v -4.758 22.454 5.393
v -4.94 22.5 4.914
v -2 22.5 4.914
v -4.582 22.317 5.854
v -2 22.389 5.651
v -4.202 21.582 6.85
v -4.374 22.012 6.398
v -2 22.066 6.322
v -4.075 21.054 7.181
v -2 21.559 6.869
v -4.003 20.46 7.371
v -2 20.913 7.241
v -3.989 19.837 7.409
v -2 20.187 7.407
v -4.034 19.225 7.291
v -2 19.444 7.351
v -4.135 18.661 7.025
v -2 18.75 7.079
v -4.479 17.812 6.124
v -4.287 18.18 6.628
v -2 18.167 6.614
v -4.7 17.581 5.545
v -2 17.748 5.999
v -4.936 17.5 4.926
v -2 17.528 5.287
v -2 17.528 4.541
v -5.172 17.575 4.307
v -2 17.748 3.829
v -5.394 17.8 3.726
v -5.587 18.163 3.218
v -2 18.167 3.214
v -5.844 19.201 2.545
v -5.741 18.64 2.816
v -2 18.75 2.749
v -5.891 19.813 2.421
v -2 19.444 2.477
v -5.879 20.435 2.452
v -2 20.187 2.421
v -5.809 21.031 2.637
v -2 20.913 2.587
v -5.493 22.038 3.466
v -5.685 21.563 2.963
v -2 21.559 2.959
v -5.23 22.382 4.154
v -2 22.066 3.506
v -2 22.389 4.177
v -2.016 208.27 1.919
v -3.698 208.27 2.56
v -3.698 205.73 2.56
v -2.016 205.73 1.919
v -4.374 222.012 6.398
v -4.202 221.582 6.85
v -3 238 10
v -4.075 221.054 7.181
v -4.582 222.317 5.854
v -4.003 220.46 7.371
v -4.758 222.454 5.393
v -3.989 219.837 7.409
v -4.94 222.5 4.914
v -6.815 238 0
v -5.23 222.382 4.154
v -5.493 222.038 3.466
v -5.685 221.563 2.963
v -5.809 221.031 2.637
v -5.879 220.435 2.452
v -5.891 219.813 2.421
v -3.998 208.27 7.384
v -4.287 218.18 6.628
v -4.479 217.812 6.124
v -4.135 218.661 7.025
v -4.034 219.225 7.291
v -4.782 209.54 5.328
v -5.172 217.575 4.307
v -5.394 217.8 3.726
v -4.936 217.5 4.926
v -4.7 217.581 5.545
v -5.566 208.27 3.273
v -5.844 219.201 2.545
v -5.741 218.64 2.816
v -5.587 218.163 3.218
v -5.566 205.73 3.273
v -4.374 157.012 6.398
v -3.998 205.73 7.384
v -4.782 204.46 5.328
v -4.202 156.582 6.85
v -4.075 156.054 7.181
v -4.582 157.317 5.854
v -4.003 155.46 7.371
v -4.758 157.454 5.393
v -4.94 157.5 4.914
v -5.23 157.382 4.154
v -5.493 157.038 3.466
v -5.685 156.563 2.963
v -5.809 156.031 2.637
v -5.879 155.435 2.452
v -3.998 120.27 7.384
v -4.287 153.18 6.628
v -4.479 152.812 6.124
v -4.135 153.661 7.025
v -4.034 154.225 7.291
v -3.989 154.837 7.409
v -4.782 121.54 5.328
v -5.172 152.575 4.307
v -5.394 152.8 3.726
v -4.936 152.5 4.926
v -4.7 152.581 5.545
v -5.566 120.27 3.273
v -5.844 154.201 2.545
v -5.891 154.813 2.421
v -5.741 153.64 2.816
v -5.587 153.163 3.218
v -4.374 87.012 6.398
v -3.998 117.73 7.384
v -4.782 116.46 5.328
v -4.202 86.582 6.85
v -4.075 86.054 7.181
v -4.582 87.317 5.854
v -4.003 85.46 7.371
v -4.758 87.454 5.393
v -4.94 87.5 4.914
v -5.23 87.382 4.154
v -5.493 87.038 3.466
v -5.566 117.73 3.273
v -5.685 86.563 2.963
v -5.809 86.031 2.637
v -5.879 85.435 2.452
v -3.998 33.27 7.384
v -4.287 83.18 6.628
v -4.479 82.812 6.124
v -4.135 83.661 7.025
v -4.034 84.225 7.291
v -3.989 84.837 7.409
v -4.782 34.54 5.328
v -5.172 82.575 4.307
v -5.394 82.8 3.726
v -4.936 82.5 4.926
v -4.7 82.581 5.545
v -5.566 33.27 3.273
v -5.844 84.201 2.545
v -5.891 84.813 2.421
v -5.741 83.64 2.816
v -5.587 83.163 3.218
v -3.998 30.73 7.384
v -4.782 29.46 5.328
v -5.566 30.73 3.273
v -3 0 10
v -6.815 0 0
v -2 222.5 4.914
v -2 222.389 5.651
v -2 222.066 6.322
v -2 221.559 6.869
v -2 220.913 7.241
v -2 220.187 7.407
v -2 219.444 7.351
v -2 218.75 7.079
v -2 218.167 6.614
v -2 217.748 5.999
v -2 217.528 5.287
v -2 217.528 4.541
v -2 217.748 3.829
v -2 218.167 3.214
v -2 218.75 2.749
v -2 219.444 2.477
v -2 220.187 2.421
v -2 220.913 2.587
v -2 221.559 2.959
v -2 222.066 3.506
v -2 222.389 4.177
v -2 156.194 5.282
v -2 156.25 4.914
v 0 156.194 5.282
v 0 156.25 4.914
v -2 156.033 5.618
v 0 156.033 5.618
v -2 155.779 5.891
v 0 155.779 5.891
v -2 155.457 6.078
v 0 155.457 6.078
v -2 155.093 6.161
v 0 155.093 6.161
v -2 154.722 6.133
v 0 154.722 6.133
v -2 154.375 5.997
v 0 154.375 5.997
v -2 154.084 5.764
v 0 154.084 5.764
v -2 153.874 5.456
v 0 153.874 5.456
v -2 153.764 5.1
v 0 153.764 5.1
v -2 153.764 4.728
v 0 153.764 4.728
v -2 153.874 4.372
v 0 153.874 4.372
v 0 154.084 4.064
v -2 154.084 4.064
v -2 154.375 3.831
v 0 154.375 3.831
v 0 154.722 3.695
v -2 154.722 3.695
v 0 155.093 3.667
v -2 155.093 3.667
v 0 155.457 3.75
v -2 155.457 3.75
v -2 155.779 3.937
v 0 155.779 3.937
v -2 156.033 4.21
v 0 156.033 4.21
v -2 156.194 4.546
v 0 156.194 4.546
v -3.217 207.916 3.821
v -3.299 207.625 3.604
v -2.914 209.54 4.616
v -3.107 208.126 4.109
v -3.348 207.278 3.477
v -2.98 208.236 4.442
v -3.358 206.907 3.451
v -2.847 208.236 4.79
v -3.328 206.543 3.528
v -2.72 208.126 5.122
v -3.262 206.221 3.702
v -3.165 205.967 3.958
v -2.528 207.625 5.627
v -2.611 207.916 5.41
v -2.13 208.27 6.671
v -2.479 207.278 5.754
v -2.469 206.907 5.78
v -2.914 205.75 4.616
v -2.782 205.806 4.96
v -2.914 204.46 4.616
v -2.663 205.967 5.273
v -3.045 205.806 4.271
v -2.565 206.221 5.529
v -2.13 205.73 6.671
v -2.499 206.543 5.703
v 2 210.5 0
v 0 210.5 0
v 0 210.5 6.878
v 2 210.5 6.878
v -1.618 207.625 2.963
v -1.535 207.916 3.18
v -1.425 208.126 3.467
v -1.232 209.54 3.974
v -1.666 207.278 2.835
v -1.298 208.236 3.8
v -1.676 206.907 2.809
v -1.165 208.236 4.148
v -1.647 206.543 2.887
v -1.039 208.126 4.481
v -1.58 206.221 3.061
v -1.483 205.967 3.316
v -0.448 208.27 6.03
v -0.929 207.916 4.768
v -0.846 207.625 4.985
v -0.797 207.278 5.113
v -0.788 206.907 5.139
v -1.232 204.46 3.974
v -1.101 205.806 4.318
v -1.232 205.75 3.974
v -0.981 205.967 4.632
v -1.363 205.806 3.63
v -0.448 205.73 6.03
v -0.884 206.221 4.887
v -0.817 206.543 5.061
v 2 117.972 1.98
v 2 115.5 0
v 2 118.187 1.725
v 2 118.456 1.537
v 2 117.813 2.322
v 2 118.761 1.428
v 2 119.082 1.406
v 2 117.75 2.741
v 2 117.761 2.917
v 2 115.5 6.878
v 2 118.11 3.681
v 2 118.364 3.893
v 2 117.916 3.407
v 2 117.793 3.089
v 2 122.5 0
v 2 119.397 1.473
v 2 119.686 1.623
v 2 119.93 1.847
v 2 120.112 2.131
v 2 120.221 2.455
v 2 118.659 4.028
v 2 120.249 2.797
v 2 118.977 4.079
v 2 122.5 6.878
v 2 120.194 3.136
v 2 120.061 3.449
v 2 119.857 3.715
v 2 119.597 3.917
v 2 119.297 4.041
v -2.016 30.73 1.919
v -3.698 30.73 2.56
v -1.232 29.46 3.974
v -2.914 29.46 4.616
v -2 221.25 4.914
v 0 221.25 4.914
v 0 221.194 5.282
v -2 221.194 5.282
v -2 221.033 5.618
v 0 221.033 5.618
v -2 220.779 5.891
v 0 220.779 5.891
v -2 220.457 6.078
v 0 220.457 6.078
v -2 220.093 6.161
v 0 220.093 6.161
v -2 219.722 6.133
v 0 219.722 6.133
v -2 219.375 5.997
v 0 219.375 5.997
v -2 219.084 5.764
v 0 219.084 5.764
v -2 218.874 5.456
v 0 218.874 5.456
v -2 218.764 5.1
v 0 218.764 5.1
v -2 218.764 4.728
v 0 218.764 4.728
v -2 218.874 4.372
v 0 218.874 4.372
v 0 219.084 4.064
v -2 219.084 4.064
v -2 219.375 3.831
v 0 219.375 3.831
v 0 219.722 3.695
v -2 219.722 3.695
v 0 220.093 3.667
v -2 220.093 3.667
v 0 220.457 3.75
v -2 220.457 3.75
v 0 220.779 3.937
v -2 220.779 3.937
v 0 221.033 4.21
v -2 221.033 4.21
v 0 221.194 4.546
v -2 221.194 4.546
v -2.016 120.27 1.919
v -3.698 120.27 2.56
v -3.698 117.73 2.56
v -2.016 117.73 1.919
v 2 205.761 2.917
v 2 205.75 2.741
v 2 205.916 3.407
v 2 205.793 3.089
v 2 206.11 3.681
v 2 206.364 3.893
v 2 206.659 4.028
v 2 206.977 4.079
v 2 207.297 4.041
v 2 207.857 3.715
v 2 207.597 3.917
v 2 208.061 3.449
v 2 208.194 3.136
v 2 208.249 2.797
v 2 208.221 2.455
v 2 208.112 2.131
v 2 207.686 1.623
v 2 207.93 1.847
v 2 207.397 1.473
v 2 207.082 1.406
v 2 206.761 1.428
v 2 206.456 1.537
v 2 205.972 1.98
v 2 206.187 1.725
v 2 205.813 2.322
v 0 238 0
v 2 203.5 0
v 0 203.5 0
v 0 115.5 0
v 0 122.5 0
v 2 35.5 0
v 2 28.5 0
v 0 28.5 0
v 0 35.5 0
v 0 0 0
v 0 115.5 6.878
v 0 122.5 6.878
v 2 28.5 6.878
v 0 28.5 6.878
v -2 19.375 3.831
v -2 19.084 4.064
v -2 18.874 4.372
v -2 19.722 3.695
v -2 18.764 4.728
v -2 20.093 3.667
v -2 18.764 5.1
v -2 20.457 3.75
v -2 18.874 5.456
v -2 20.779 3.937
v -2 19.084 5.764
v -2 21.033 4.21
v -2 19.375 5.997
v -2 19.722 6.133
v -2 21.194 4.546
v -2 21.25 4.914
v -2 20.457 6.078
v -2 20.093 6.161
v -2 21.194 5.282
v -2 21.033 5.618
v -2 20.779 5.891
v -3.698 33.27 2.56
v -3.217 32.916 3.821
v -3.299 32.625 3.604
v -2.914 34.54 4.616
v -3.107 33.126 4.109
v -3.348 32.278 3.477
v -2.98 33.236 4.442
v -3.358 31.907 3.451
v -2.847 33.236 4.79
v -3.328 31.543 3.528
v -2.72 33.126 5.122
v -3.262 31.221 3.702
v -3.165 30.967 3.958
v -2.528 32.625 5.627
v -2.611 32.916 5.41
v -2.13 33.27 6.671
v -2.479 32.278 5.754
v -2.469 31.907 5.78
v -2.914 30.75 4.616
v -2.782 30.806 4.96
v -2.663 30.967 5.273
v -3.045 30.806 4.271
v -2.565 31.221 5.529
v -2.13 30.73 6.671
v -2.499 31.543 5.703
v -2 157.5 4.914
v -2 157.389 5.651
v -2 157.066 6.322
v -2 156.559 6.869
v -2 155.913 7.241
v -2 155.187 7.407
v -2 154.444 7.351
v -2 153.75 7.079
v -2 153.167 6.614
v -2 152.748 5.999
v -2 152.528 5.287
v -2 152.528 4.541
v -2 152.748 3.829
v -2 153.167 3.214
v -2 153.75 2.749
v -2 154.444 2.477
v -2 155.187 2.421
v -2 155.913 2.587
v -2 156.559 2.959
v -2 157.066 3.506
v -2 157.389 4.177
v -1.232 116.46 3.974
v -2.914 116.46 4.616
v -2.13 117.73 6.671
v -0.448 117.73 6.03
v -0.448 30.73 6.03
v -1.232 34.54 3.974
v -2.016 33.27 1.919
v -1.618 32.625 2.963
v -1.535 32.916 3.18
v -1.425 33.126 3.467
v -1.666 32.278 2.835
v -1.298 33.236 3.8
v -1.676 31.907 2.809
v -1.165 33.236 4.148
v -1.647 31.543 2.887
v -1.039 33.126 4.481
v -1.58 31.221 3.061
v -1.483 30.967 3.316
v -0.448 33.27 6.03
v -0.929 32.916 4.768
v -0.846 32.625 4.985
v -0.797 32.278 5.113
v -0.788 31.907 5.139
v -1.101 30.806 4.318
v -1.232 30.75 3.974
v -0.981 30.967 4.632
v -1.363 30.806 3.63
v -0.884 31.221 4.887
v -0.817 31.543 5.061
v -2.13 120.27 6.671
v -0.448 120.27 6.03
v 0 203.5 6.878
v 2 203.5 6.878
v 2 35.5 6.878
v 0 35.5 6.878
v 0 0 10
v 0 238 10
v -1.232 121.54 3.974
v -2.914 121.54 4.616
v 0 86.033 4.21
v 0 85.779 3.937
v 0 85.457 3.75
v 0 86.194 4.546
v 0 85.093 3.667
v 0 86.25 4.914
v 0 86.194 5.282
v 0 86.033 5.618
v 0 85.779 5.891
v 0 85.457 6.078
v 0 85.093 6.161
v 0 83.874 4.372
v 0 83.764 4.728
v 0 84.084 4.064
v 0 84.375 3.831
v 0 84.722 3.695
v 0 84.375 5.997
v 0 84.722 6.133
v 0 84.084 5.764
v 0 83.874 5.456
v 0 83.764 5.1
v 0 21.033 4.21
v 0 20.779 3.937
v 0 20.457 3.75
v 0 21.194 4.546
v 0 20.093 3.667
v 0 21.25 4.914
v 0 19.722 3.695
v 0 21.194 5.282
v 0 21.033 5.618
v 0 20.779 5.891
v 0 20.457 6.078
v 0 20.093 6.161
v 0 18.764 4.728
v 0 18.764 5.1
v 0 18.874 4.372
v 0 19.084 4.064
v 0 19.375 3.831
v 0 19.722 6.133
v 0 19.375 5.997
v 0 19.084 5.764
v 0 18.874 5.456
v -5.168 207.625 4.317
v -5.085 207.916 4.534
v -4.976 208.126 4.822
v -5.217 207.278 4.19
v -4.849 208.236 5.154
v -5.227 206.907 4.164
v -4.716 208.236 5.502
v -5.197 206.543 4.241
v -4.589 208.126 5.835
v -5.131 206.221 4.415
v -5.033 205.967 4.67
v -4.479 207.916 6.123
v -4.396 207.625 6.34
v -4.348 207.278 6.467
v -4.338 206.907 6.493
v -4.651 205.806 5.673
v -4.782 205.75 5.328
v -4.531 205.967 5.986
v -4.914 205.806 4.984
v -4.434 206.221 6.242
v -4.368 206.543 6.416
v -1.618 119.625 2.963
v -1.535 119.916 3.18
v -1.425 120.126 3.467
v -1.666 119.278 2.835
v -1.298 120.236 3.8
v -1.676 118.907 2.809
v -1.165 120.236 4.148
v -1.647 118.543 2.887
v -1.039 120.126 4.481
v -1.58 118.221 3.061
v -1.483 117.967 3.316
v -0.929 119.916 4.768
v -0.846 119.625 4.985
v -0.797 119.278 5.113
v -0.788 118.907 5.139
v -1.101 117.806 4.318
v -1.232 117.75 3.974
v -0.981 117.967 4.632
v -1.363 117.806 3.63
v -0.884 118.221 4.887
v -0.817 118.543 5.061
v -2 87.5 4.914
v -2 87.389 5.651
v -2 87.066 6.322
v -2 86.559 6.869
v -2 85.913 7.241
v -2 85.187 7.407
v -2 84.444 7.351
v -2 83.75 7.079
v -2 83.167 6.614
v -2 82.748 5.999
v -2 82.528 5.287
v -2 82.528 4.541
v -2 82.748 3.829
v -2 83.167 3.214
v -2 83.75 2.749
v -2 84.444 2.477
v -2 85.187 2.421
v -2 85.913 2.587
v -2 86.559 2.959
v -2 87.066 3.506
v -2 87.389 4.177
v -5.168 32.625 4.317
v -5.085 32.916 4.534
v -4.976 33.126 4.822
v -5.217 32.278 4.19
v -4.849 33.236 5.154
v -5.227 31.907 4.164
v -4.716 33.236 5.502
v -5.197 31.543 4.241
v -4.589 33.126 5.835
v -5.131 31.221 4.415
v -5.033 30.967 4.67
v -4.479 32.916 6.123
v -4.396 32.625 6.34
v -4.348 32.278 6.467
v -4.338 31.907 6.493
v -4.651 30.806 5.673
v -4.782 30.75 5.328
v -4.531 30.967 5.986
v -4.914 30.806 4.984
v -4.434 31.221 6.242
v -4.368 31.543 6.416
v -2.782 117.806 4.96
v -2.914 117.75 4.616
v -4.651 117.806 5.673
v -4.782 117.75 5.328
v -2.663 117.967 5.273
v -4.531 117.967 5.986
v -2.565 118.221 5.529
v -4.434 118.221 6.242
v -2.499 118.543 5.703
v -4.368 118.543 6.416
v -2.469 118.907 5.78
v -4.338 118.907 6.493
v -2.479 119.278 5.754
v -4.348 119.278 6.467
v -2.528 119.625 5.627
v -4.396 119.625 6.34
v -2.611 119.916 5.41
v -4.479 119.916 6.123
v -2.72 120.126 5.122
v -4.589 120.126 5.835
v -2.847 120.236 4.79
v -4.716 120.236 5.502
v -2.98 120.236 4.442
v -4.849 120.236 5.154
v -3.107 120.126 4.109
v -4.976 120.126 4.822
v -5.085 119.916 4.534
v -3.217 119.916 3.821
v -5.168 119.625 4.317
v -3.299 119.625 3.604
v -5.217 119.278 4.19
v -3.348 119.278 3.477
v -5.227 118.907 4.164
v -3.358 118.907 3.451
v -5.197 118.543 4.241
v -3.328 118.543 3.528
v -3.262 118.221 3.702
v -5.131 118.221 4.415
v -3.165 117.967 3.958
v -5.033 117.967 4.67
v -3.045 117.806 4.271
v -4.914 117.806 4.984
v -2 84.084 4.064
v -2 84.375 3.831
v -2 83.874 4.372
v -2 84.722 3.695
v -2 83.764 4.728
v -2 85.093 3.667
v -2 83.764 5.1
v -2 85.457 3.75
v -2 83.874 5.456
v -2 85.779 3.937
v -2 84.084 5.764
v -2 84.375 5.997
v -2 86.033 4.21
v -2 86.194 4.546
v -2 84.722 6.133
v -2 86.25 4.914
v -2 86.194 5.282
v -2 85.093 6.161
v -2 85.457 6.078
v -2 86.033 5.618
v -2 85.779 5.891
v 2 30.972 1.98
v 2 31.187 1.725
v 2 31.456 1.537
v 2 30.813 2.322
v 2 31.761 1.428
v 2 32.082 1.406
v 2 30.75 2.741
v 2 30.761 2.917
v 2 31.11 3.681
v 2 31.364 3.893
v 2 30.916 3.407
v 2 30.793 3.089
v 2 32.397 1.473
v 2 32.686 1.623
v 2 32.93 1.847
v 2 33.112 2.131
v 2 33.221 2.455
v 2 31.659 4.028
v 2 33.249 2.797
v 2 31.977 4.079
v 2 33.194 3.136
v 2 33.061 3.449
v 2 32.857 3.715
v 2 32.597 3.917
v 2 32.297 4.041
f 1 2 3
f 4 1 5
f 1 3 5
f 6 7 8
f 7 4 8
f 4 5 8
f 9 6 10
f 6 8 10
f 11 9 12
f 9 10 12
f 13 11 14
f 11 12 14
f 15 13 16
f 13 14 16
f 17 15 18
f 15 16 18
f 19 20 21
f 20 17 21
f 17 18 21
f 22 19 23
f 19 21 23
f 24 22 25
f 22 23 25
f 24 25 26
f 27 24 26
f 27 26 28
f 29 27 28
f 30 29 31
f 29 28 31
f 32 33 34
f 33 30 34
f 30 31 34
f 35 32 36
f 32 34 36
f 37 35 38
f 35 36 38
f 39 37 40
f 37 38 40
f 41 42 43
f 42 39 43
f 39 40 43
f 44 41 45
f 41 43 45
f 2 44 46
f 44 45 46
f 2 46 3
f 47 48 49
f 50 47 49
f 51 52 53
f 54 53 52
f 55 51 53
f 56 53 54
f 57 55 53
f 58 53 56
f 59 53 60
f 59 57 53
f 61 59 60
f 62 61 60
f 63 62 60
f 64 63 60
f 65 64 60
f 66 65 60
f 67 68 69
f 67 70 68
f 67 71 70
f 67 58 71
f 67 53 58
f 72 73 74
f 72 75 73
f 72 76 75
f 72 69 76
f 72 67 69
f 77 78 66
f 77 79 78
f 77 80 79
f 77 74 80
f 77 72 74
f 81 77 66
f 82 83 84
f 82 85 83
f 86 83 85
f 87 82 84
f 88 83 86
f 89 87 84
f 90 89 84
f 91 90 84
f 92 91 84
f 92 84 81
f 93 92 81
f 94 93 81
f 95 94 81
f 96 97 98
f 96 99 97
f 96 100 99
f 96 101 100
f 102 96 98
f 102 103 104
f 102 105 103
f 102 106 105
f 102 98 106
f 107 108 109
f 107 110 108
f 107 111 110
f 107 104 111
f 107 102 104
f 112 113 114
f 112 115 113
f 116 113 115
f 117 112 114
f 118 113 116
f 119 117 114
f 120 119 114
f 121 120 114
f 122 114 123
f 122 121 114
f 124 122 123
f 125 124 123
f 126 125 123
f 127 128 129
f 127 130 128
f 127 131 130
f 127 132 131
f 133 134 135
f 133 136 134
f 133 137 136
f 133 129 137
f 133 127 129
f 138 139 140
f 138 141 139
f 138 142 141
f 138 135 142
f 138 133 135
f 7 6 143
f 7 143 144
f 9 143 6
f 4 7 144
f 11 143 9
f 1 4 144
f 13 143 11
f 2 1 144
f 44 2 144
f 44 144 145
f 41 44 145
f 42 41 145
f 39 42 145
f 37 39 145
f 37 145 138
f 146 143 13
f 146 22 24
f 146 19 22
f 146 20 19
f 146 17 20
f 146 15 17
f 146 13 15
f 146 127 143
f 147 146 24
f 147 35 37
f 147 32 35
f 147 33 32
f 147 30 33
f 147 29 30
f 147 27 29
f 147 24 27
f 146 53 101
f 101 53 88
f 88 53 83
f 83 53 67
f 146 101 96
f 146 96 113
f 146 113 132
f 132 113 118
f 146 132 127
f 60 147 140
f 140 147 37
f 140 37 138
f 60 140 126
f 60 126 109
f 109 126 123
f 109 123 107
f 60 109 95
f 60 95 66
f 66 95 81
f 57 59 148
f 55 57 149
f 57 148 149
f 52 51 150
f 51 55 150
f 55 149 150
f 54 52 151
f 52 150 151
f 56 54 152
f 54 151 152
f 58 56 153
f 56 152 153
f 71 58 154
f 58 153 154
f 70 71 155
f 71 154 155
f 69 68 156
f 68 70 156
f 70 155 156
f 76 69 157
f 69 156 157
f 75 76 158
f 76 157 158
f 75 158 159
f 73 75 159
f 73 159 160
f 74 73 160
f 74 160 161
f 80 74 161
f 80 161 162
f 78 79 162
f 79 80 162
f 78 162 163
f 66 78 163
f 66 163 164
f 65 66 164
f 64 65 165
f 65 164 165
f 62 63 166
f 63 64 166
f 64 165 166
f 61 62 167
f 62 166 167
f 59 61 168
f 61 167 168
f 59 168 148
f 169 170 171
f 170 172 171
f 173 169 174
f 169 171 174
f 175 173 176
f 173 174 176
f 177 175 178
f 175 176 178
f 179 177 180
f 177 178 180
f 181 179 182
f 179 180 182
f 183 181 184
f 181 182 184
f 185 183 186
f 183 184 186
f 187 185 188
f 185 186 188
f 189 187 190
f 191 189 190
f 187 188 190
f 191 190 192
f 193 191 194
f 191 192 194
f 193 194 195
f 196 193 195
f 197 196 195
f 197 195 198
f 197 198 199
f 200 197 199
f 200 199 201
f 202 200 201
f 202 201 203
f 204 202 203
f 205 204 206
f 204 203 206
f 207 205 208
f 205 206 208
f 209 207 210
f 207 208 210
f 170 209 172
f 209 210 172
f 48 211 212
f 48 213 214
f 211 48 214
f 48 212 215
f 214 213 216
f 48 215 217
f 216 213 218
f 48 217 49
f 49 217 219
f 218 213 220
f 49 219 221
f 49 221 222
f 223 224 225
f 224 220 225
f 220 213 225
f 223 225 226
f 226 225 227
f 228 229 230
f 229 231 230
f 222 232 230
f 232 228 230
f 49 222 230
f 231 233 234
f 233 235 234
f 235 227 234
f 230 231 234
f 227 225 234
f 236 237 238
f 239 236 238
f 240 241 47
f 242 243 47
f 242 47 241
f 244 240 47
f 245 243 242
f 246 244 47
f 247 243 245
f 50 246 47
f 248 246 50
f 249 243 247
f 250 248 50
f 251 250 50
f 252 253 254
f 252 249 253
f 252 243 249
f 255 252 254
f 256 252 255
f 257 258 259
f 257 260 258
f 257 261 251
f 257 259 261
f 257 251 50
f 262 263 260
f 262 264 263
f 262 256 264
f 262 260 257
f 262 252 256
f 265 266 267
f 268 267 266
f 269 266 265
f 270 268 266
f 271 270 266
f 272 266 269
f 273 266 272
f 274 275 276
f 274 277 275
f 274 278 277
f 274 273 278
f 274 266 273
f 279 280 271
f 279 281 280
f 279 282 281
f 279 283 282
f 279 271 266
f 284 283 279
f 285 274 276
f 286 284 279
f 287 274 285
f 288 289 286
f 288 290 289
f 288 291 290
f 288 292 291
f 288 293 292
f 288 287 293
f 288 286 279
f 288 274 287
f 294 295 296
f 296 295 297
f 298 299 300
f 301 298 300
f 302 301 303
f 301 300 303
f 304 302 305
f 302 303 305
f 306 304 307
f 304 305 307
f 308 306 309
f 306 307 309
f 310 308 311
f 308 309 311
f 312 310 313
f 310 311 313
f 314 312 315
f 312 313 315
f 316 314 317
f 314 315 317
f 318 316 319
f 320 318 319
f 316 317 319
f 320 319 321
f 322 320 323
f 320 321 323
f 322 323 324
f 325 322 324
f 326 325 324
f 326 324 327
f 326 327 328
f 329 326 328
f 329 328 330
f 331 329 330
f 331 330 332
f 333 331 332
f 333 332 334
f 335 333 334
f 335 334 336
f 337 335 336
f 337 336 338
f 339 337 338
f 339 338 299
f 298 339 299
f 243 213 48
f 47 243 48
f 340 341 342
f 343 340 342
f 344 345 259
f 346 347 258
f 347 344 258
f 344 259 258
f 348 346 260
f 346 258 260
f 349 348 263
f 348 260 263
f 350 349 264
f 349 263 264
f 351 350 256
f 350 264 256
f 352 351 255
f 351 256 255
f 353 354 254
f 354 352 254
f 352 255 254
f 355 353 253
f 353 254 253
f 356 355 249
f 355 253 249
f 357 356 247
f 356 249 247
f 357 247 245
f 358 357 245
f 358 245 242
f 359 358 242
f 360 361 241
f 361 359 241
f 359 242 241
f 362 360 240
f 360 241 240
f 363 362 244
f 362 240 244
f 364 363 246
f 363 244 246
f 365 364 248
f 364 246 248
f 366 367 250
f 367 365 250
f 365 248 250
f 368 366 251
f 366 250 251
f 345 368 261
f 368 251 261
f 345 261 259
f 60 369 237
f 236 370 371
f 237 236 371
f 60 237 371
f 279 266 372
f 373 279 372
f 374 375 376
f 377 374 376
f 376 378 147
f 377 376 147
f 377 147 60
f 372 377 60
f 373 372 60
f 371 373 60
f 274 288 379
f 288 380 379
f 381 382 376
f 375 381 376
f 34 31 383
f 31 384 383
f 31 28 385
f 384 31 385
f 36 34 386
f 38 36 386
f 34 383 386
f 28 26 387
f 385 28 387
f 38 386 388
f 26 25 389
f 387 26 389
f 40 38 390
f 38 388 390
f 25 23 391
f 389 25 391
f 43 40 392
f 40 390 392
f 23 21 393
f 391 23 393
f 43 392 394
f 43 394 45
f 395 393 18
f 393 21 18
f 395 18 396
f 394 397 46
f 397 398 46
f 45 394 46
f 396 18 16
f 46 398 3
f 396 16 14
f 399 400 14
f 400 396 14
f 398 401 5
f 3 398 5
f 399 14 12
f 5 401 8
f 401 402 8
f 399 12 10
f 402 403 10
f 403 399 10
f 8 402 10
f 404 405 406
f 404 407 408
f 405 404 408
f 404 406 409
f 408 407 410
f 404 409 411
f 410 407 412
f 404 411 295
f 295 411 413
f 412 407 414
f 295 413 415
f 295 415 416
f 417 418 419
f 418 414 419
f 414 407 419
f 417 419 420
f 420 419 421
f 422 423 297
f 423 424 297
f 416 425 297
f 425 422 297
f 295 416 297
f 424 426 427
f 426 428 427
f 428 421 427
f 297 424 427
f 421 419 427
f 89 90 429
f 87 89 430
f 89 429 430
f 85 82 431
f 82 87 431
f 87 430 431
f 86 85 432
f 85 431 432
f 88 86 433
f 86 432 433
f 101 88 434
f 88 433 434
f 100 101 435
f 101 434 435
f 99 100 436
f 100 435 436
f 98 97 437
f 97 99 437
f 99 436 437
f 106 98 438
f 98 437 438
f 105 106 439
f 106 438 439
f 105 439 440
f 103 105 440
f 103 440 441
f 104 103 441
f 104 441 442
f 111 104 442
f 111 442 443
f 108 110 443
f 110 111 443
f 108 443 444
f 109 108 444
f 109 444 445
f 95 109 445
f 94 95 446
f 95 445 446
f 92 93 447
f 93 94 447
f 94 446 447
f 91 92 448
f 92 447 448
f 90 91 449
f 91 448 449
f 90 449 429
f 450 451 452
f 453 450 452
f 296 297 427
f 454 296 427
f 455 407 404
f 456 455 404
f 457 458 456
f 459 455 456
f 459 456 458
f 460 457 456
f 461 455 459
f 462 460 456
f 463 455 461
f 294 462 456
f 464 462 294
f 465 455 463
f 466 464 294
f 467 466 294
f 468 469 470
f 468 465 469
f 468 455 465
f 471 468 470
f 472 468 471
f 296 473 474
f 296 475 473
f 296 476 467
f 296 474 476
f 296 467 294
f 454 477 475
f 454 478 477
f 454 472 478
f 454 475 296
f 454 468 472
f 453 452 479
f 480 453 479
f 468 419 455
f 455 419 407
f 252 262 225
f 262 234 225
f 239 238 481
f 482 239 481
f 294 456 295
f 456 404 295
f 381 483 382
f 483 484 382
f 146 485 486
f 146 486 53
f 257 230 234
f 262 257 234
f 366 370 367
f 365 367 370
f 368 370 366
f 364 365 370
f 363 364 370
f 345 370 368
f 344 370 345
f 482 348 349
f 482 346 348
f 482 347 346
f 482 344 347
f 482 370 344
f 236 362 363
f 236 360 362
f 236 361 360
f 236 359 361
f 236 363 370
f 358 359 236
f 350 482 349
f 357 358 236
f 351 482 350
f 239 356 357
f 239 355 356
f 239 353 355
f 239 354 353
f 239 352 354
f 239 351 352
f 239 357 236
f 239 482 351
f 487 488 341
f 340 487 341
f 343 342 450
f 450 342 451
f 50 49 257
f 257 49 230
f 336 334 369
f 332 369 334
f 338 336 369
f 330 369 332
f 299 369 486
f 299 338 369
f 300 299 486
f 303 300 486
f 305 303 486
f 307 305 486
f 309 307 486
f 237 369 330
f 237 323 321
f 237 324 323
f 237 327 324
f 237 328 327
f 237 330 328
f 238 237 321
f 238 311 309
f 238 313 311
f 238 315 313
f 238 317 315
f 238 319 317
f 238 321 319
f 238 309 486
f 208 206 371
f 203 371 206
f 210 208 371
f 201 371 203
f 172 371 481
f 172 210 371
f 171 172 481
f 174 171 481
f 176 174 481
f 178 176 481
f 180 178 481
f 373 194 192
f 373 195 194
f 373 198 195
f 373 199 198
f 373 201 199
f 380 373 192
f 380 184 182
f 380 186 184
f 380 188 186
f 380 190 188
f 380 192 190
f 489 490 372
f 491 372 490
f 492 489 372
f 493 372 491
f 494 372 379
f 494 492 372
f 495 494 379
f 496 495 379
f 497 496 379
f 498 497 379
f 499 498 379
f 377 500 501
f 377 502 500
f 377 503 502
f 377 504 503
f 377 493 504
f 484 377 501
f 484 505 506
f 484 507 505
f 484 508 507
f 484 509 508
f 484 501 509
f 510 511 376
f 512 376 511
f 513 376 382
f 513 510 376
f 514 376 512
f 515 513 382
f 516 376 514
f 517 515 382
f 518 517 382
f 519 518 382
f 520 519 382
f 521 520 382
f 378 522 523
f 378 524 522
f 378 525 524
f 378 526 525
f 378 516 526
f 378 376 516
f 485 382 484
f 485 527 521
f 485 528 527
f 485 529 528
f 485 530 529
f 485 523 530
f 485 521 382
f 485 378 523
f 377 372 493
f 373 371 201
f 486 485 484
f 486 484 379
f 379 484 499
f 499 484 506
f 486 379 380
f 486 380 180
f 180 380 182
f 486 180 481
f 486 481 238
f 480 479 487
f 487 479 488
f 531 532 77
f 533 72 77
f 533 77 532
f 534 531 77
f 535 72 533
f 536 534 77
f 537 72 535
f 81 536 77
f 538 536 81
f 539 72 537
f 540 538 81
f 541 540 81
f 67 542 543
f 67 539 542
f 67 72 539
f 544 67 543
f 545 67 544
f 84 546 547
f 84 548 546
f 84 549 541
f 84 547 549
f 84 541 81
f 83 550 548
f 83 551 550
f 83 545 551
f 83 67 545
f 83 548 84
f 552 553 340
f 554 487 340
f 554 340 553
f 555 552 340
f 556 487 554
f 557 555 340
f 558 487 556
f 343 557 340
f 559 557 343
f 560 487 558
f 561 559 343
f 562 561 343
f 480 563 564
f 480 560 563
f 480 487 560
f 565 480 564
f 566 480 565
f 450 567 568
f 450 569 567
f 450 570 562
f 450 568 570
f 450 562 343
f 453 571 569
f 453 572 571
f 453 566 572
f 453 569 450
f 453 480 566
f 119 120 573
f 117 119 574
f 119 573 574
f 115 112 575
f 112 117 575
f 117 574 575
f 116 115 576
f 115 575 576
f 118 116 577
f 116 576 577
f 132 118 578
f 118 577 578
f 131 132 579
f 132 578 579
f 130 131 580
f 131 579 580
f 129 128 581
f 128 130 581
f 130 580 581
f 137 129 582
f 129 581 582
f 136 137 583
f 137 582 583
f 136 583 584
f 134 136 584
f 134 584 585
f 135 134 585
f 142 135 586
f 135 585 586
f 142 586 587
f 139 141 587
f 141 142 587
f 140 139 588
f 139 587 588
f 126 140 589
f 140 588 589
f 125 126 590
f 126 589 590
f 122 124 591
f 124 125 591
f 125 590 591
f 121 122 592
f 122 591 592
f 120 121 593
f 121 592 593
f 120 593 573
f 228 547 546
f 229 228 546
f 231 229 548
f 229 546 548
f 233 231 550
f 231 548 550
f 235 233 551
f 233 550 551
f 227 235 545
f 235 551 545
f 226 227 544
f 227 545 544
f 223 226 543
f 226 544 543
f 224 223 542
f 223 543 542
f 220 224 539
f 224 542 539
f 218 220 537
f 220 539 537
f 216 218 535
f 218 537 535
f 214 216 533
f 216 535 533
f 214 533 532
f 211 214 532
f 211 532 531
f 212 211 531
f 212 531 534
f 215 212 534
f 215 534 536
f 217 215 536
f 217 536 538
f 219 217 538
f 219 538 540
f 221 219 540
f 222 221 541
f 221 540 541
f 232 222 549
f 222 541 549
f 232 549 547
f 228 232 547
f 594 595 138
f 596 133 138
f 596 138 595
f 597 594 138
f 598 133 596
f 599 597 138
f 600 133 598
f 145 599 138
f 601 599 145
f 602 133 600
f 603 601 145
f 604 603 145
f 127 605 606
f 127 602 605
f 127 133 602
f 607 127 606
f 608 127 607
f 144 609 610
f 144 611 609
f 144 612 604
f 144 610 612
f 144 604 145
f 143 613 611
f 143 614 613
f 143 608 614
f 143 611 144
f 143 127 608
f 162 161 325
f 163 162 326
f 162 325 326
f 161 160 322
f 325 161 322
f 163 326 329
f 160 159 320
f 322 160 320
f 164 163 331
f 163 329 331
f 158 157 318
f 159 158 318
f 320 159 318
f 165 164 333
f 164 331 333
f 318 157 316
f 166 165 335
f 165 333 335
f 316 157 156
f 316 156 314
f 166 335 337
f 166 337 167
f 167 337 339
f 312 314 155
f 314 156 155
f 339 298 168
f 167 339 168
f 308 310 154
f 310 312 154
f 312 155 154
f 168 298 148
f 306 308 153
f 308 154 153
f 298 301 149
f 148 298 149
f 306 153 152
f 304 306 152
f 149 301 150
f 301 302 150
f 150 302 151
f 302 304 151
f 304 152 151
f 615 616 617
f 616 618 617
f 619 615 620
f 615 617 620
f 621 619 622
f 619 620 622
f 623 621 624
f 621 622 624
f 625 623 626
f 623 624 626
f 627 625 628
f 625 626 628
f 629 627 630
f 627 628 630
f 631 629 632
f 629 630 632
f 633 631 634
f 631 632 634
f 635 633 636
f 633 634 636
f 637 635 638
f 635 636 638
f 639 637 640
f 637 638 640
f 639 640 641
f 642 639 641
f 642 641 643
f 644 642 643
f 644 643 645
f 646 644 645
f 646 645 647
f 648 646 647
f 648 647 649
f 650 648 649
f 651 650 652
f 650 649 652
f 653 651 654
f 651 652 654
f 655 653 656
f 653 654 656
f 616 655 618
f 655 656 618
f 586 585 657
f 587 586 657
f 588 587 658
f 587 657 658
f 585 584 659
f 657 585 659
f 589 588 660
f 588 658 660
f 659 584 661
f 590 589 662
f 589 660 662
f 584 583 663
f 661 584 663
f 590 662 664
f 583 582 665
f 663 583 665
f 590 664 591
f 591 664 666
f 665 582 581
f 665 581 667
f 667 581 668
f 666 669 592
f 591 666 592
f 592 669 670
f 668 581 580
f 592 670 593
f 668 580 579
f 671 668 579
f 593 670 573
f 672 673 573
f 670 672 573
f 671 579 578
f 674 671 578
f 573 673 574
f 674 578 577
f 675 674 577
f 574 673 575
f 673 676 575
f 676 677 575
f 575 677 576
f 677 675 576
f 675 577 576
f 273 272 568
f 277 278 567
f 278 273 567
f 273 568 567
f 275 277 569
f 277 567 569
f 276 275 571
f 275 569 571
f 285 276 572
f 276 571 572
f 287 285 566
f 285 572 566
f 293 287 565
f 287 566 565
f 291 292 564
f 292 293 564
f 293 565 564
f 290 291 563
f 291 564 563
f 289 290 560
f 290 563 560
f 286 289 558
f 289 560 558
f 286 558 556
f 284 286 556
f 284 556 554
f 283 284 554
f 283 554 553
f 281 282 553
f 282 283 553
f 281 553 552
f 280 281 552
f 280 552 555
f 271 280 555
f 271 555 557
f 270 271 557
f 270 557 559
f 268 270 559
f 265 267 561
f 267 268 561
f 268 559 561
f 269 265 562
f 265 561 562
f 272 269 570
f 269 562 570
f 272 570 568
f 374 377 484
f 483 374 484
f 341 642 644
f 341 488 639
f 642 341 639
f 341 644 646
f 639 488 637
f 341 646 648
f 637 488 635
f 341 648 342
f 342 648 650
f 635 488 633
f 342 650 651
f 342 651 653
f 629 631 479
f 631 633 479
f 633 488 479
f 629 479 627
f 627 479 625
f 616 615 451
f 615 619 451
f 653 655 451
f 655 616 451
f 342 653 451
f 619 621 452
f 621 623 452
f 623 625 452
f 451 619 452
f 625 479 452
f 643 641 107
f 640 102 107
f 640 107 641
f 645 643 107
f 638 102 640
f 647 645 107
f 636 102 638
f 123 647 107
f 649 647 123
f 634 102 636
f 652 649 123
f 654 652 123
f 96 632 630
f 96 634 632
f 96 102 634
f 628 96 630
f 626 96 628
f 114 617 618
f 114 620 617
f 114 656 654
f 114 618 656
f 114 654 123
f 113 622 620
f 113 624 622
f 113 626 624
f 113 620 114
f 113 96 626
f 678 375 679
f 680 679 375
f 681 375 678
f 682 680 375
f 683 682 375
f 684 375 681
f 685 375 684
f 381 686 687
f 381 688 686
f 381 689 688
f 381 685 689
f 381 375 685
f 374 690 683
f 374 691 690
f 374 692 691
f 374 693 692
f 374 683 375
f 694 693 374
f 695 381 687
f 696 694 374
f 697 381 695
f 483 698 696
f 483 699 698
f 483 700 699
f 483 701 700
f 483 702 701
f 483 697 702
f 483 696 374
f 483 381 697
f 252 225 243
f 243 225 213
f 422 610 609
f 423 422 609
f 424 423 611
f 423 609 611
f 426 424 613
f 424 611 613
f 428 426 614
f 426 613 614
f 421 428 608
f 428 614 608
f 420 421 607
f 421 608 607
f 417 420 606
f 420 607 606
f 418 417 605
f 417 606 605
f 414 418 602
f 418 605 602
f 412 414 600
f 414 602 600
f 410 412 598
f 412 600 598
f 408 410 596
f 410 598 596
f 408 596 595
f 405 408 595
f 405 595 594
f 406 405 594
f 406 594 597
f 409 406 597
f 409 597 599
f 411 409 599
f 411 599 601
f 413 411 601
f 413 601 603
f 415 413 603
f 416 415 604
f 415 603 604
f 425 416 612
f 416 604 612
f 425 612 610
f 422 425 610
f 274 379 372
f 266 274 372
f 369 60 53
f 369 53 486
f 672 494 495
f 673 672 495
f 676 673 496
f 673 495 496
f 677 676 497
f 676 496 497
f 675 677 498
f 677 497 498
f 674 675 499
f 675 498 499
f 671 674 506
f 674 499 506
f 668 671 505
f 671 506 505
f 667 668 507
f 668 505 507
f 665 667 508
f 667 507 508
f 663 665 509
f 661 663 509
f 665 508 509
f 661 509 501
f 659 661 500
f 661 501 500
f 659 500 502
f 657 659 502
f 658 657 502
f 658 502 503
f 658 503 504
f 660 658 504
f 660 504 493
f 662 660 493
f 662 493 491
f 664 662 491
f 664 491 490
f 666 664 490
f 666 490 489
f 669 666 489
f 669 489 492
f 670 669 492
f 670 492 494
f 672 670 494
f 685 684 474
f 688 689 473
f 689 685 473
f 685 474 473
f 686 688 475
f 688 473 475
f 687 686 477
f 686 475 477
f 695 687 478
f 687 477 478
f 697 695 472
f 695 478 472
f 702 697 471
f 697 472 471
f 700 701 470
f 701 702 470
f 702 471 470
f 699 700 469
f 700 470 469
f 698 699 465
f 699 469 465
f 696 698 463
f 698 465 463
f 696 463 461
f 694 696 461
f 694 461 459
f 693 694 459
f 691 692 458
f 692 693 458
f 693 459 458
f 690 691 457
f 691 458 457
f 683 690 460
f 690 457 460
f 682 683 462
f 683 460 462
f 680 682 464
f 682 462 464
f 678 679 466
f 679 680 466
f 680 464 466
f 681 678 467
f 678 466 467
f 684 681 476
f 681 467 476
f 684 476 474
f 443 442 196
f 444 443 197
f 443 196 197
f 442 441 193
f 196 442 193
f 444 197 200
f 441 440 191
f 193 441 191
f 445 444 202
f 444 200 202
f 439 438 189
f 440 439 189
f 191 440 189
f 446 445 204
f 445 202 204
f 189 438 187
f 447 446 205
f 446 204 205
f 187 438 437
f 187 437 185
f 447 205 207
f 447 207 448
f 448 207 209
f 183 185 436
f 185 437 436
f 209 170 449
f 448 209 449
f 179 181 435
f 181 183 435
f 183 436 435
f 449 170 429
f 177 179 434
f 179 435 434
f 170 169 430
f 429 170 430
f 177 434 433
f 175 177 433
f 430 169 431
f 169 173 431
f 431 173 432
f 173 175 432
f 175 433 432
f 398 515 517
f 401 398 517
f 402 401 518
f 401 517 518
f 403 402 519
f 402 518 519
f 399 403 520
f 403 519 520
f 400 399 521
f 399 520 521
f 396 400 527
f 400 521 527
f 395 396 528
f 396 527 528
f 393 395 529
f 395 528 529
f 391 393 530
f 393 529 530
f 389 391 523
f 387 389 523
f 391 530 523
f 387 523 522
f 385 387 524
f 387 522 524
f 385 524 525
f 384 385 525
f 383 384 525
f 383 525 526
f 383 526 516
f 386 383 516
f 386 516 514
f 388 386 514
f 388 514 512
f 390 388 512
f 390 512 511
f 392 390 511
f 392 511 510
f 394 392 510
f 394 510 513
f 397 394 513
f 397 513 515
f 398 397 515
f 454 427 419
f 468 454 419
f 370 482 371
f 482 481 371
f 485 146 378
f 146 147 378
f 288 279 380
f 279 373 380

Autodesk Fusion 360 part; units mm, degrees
sketch "Skizze1" plane through (0, 0, 0) normal (0, 1, 0) x (1, 0, 0)
  line L0 (-29.0267, 0) -> (32.308, 0) construction
  line L1 (0, -25.3668) -> (0, 26.124) construction
  line L2 (0, 0) -> (0, -10)
  line L3 (0, -10) -> (-3, -10)
  line L4 (0, 0) -> (-6.815, 0)
  line L5 (-3, -10) -> (-6.815, 0)
  dimension "d1" = 10
  dimension "d2" = 6.815
  dimension "d3" = 3
extrude "Extrusion1" add sketch "Skizze1" along normal blind 238
sketch "Skizze2" plane through (0, 0, 0) normal (1, 0, 0) x (0, 1, 0)
  line L0 (0, 32.3505) -> (0, -25.958) construction
  line L1 (-11.6611, 0) -> (310, 0) construction
  line L2 (119, 63.4137) -> (119, -57.7153) construction
  line L3 (20, 43.9775) -> (20, -44.5265) construction
  line L4 (220, 51.6132) -> (220, -50) construction
  line L5 (85, 33.2182) -> (85, -47.6502) construction
  line L6 (155, 33.2182) -> (155, -42.444) construction
  line L7 (261.5293, 4.914) -> (-37.3941, 4.914) construction
  circle A0 centre (220, 4.914) radius 1.25
  circle A1 centre (220, 4.914) radius 2.5
  circle A2 centre (155, 4.914) radius 1.25
  circle A3 centre (155, 4.914) radius 2.5
  circle A4 centre (85, 4.914) radius 1.25
  circle A5 centre (85, 4.914) radius 2.5
  circle A6 centre (20, 4.914) radius 1.25
  circle A7 centre (20, 4.914) radius 2.5
  line L8 (207, 25.1754) -> (207, -27.1787) construction
  line L9 (32, 29.9975) -> (32, -45.4338) construction
  line L10 (257.1127, 6.878) -> (-52.1736, 6.878) construction
  line L11 (203.5, 0) -> (210.5, 0)
  line L12 (210.5, 0) -> (210.5, 6.878)
  line L13 (210.5, 6.878) -> (203.5, 6.878)
  line L14 (203.5, 6.878) -> (203.5, 0)
  line L15 (203.5, 0) -> (210.5, 6.878) construction
  line L16 (210.5, 0) -> (203.5, 6.878) construction
  line L17 (115.5, 0) -> (122.5, 0)
  line L18 (122.5, 0) -> (122.5, 6.878)
  line L19 (122.5, 6.878) -> (115.5, 6.878)
  line L20 (115.5, 6.878) -> (115.5, 0)
  line L21 (115.5, 0) -> (122.5, 6.878) construction
  line L22 (122.5, 0) -> (115.5, 6.878) construction
  line L23 (28.5, 0) -> (35.5, 0)
  line L24 (35.5, 0) -> (35.5, 6.878)
  line L25 (35.5, 6.878) -> (28.5, 6.878)
  line L26 (28.5, 6.878) -> (28.5, 0)
  line L27 (28.5, 0) -> (35.5, 6.878) construction
  line L28 (35.5, 0) -> (28.5, 6.878) construction
  point P0 (207, 3.439)
  point P1 (119, 3.439)
  point P2 (32, 3.439)
  dimension "d6" = 119
  dimension "d7" = 101
  dimension "d8" = 99
  dimension "d9" = 34
  dimension "d10" = 36
  dimension "d11" = 4.914
  dimension "d12" = 2.5
  dimension "d13" = 5
  dimension "d14" = 2.5
  dimension "d15" = 5
  dimension "d16" = 2.5
  dimension "d17" = 5
  dimension "d18" = 2.5
  dimension "d19" = 5
  dimension "d24" = 87
  dimension "d25" = 88
  dimension "d26" = 6.878
  dimension "d27" = 7
  dimension "d28" = 7
  dimension "d29" = 7
extrude "Extrusion2" cut sketch "Skizze2" against normal blind 10 contours A0 | A1 | A2 | A3 | A4 | A5 | A6 | A7
extrude "Extrusion3" add sketch "Skizze2" against normal blind 2 contours A1 | A3 | A5 | A7
extrude "Extrusion4" add sketch "Skizze2" along normal blind 2 contours L11 L12 L13 L14 | L17 L18 L19 L20 | L23 L24 L25 L26
sketch "Skizze3" plane through (-5.9491, 0, 2.2696) normal (-0.9343, 0, 0.3564) x (0, -1, 0)
  ellipse E0 centre (-155, 2.8303) end of major axis (-155, 0.1546) minor radius 2.5
  ellipse E1 centre (-85, 2.8303) end of major axis (-85, 0.1546) minor radius 2.5
  ellipse E2 centre (-220, 2.8303) end of major axis (-220, 0.1546) minor radius 2.5
  ellipse E3 centre (-20, 2.8303) end of major axis (-20, 0.1546) minor radius 2.5
  line L0 (0, -2.4292) -> (0, 8.2738)
  line L1 (0, 8.2738) -> (-238, 8.2738)
  line L2 (-238, 8.2738) -> (-238, -2.4292)
  line L3 (-238, -2.4292) -> (0, -2.4292)
  line L4 (-256.1946, 8.2738) -> (13.3488, 8.2738) construction
  line L5 (-271.6873, 3.2738) -> (21.7349, 3.2738) construction
  line L6 (0, 76.206) -> (0, -63.9663) construction
  line L7 (-207, 69.0398) -> (-207, -61.5402) construction
  line L8 (-119, 70) -> (-119, -67.3252) construction
  line L9 (-32, 63.2186) -> (-32, -40) construction
  circle A0 centre (-207, 3.2738) radius 1.25
  circle A1 centre (-119, 3.2738) radius 1.25
  circle A2 centre (-32, 3.2738) radius 1.25
  line L10 (-205.7298, 1.0738) -> (-204.4597, 3.2738)
  line L11 (-204.4597, 3.2738) -> (-205.7298, 5.4738)
  line L12 (-205.7298, 5.4738) -> (-208.2702, 5.4738)
  line L13 (-208.2702, 5.4738) -> (-209.5403, 3.2738)
  line L14 (-209.5403, 3.2738) -> (-208.2702, 1.0738)
  line L15 (-208.2702, 1.0738) -> (-205.7298, 1.0738)
  line L16 (-117.7298, 1.0738) -> (-116.4597, 3.2738)
  line L17 (-116.4597, 3.2738) -> (-117.7298, 5.4738)
  line L18 (-117.7298, 5.4738) -> (-120.2702, 5.4738)
  line L19 (-120.2702, 5.4738) -> (-121.5403, 3.2738)
  line L20 (-121.5403, 3.2738) -> (-120.2702, 1.0738)
  line L21 (-120.2702, 1.0738) -> (-117.7298, 1.0738)
  line L22 (-30.7298, 1.0738) -> (-29.4597, 3.2738)
  line L23 (-29.4597, 3.2738) -> (-30.7298, 5.4738)
  line L24 (-30.7298, 5.4738) -> (-33.2702, 5.4738)
  line L25 (-33.2702, 5.4738) -> (-34.5403, 3.2738)
  line L26 (-34.5403, 3.2738) -> (-33.2702, 1.0738)
  line L27 (-33.2702, 1.0738) -> (-30.7298, 1.0738)
  point P0 (-207, 3.2738)
  point P1 (-119, 3.2738)
  point P2 (-32, 3.2738)
  dimension "d32" = 5
  dimension "d35" = 119
  dimension "d36" = 87
  dimension "d37" = 88
  dimension "d38" = 2.5
  dimension "d39" = 2.5
  dimension "d40" = 2.5
  dimension "d41" = 4.4
  dimension "d42" = 4.4
  dimension "d43" = 4.4
extrude "Extrusion5" cut sketch "Skizze3" against normal blind 8 contours A0 | A1 | A2
extrude "Extrusion6" cut sketch "Skizze3" against normal blind 3.8 contours L10 L11 L12 L13 L14 L15 | L16 L17 L18 L19 L20 L21 | L22 L23 L24 L25 L26 L27
extrude "Extrusion7" add sketch "Skizze3" against normal blind 2 contours L10 L11 L12 L13 L14 L15 | L16 L17 L18 L19 L20 L21 | L22 L23 L24 L25 L26 L27
